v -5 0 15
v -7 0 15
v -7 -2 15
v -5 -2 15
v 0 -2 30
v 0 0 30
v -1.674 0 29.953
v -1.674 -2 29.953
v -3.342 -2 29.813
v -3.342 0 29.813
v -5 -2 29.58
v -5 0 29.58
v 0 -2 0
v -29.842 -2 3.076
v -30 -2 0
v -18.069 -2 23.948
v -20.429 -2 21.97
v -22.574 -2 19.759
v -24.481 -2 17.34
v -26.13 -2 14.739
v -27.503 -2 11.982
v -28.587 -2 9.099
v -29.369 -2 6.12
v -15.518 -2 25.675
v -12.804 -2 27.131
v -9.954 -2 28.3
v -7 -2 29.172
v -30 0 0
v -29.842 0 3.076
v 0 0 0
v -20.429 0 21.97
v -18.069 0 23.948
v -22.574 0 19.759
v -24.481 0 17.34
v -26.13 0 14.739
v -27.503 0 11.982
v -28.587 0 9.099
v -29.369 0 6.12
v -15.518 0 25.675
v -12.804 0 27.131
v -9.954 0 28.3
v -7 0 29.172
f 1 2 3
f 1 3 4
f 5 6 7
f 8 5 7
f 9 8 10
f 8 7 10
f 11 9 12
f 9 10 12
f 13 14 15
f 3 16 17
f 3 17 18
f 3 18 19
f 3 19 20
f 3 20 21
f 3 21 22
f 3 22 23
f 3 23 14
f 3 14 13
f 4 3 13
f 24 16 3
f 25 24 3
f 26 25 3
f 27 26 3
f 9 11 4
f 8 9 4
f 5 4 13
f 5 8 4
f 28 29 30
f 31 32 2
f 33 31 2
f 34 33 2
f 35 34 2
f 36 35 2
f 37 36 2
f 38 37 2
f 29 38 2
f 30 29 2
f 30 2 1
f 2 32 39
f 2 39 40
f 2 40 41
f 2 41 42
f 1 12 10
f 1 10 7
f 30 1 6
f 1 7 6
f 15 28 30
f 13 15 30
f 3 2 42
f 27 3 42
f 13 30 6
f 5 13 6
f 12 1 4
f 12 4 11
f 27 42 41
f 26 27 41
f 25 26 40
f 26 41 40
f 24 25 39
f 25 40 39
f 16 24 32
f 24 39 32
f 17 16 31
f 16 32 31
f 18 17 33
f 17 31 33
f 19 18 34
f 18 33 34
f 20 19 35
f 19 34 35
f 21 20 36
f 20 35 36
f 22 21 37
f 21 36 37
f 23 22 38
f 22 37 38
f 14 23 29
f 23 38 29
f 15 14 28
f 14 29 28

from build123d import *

# Parameters (mm, degrees)
F1_DEPTH = 2
F2_W     = 2
F2_H     = 14.964955
F3_DEPTH = 25


with BuildPart() as f1:
    # F0 (on Front) → F1 (new body)
    with BuildSketch(Plane.XZ):
        with BuildLine():
            ThreePointArc((0, 30), (-21.213203, 21.213203), (-30, 0))
            Line((-30, 0), (0, 0))
            Line((0, 0), (0, 30))
        make_face()
    extrude(amount=F1_DEPTH)

    # F2 (on Front) → F3 (cut)
    with BuildSketch(Plane.XZ):
        with Locations((-6, 22.482478)):
            Rectangle(F2_W, F2_H)
    extrude(amount=F3_DEPTH, mode=Mode.SUBTRACT)


solid = f1.part
